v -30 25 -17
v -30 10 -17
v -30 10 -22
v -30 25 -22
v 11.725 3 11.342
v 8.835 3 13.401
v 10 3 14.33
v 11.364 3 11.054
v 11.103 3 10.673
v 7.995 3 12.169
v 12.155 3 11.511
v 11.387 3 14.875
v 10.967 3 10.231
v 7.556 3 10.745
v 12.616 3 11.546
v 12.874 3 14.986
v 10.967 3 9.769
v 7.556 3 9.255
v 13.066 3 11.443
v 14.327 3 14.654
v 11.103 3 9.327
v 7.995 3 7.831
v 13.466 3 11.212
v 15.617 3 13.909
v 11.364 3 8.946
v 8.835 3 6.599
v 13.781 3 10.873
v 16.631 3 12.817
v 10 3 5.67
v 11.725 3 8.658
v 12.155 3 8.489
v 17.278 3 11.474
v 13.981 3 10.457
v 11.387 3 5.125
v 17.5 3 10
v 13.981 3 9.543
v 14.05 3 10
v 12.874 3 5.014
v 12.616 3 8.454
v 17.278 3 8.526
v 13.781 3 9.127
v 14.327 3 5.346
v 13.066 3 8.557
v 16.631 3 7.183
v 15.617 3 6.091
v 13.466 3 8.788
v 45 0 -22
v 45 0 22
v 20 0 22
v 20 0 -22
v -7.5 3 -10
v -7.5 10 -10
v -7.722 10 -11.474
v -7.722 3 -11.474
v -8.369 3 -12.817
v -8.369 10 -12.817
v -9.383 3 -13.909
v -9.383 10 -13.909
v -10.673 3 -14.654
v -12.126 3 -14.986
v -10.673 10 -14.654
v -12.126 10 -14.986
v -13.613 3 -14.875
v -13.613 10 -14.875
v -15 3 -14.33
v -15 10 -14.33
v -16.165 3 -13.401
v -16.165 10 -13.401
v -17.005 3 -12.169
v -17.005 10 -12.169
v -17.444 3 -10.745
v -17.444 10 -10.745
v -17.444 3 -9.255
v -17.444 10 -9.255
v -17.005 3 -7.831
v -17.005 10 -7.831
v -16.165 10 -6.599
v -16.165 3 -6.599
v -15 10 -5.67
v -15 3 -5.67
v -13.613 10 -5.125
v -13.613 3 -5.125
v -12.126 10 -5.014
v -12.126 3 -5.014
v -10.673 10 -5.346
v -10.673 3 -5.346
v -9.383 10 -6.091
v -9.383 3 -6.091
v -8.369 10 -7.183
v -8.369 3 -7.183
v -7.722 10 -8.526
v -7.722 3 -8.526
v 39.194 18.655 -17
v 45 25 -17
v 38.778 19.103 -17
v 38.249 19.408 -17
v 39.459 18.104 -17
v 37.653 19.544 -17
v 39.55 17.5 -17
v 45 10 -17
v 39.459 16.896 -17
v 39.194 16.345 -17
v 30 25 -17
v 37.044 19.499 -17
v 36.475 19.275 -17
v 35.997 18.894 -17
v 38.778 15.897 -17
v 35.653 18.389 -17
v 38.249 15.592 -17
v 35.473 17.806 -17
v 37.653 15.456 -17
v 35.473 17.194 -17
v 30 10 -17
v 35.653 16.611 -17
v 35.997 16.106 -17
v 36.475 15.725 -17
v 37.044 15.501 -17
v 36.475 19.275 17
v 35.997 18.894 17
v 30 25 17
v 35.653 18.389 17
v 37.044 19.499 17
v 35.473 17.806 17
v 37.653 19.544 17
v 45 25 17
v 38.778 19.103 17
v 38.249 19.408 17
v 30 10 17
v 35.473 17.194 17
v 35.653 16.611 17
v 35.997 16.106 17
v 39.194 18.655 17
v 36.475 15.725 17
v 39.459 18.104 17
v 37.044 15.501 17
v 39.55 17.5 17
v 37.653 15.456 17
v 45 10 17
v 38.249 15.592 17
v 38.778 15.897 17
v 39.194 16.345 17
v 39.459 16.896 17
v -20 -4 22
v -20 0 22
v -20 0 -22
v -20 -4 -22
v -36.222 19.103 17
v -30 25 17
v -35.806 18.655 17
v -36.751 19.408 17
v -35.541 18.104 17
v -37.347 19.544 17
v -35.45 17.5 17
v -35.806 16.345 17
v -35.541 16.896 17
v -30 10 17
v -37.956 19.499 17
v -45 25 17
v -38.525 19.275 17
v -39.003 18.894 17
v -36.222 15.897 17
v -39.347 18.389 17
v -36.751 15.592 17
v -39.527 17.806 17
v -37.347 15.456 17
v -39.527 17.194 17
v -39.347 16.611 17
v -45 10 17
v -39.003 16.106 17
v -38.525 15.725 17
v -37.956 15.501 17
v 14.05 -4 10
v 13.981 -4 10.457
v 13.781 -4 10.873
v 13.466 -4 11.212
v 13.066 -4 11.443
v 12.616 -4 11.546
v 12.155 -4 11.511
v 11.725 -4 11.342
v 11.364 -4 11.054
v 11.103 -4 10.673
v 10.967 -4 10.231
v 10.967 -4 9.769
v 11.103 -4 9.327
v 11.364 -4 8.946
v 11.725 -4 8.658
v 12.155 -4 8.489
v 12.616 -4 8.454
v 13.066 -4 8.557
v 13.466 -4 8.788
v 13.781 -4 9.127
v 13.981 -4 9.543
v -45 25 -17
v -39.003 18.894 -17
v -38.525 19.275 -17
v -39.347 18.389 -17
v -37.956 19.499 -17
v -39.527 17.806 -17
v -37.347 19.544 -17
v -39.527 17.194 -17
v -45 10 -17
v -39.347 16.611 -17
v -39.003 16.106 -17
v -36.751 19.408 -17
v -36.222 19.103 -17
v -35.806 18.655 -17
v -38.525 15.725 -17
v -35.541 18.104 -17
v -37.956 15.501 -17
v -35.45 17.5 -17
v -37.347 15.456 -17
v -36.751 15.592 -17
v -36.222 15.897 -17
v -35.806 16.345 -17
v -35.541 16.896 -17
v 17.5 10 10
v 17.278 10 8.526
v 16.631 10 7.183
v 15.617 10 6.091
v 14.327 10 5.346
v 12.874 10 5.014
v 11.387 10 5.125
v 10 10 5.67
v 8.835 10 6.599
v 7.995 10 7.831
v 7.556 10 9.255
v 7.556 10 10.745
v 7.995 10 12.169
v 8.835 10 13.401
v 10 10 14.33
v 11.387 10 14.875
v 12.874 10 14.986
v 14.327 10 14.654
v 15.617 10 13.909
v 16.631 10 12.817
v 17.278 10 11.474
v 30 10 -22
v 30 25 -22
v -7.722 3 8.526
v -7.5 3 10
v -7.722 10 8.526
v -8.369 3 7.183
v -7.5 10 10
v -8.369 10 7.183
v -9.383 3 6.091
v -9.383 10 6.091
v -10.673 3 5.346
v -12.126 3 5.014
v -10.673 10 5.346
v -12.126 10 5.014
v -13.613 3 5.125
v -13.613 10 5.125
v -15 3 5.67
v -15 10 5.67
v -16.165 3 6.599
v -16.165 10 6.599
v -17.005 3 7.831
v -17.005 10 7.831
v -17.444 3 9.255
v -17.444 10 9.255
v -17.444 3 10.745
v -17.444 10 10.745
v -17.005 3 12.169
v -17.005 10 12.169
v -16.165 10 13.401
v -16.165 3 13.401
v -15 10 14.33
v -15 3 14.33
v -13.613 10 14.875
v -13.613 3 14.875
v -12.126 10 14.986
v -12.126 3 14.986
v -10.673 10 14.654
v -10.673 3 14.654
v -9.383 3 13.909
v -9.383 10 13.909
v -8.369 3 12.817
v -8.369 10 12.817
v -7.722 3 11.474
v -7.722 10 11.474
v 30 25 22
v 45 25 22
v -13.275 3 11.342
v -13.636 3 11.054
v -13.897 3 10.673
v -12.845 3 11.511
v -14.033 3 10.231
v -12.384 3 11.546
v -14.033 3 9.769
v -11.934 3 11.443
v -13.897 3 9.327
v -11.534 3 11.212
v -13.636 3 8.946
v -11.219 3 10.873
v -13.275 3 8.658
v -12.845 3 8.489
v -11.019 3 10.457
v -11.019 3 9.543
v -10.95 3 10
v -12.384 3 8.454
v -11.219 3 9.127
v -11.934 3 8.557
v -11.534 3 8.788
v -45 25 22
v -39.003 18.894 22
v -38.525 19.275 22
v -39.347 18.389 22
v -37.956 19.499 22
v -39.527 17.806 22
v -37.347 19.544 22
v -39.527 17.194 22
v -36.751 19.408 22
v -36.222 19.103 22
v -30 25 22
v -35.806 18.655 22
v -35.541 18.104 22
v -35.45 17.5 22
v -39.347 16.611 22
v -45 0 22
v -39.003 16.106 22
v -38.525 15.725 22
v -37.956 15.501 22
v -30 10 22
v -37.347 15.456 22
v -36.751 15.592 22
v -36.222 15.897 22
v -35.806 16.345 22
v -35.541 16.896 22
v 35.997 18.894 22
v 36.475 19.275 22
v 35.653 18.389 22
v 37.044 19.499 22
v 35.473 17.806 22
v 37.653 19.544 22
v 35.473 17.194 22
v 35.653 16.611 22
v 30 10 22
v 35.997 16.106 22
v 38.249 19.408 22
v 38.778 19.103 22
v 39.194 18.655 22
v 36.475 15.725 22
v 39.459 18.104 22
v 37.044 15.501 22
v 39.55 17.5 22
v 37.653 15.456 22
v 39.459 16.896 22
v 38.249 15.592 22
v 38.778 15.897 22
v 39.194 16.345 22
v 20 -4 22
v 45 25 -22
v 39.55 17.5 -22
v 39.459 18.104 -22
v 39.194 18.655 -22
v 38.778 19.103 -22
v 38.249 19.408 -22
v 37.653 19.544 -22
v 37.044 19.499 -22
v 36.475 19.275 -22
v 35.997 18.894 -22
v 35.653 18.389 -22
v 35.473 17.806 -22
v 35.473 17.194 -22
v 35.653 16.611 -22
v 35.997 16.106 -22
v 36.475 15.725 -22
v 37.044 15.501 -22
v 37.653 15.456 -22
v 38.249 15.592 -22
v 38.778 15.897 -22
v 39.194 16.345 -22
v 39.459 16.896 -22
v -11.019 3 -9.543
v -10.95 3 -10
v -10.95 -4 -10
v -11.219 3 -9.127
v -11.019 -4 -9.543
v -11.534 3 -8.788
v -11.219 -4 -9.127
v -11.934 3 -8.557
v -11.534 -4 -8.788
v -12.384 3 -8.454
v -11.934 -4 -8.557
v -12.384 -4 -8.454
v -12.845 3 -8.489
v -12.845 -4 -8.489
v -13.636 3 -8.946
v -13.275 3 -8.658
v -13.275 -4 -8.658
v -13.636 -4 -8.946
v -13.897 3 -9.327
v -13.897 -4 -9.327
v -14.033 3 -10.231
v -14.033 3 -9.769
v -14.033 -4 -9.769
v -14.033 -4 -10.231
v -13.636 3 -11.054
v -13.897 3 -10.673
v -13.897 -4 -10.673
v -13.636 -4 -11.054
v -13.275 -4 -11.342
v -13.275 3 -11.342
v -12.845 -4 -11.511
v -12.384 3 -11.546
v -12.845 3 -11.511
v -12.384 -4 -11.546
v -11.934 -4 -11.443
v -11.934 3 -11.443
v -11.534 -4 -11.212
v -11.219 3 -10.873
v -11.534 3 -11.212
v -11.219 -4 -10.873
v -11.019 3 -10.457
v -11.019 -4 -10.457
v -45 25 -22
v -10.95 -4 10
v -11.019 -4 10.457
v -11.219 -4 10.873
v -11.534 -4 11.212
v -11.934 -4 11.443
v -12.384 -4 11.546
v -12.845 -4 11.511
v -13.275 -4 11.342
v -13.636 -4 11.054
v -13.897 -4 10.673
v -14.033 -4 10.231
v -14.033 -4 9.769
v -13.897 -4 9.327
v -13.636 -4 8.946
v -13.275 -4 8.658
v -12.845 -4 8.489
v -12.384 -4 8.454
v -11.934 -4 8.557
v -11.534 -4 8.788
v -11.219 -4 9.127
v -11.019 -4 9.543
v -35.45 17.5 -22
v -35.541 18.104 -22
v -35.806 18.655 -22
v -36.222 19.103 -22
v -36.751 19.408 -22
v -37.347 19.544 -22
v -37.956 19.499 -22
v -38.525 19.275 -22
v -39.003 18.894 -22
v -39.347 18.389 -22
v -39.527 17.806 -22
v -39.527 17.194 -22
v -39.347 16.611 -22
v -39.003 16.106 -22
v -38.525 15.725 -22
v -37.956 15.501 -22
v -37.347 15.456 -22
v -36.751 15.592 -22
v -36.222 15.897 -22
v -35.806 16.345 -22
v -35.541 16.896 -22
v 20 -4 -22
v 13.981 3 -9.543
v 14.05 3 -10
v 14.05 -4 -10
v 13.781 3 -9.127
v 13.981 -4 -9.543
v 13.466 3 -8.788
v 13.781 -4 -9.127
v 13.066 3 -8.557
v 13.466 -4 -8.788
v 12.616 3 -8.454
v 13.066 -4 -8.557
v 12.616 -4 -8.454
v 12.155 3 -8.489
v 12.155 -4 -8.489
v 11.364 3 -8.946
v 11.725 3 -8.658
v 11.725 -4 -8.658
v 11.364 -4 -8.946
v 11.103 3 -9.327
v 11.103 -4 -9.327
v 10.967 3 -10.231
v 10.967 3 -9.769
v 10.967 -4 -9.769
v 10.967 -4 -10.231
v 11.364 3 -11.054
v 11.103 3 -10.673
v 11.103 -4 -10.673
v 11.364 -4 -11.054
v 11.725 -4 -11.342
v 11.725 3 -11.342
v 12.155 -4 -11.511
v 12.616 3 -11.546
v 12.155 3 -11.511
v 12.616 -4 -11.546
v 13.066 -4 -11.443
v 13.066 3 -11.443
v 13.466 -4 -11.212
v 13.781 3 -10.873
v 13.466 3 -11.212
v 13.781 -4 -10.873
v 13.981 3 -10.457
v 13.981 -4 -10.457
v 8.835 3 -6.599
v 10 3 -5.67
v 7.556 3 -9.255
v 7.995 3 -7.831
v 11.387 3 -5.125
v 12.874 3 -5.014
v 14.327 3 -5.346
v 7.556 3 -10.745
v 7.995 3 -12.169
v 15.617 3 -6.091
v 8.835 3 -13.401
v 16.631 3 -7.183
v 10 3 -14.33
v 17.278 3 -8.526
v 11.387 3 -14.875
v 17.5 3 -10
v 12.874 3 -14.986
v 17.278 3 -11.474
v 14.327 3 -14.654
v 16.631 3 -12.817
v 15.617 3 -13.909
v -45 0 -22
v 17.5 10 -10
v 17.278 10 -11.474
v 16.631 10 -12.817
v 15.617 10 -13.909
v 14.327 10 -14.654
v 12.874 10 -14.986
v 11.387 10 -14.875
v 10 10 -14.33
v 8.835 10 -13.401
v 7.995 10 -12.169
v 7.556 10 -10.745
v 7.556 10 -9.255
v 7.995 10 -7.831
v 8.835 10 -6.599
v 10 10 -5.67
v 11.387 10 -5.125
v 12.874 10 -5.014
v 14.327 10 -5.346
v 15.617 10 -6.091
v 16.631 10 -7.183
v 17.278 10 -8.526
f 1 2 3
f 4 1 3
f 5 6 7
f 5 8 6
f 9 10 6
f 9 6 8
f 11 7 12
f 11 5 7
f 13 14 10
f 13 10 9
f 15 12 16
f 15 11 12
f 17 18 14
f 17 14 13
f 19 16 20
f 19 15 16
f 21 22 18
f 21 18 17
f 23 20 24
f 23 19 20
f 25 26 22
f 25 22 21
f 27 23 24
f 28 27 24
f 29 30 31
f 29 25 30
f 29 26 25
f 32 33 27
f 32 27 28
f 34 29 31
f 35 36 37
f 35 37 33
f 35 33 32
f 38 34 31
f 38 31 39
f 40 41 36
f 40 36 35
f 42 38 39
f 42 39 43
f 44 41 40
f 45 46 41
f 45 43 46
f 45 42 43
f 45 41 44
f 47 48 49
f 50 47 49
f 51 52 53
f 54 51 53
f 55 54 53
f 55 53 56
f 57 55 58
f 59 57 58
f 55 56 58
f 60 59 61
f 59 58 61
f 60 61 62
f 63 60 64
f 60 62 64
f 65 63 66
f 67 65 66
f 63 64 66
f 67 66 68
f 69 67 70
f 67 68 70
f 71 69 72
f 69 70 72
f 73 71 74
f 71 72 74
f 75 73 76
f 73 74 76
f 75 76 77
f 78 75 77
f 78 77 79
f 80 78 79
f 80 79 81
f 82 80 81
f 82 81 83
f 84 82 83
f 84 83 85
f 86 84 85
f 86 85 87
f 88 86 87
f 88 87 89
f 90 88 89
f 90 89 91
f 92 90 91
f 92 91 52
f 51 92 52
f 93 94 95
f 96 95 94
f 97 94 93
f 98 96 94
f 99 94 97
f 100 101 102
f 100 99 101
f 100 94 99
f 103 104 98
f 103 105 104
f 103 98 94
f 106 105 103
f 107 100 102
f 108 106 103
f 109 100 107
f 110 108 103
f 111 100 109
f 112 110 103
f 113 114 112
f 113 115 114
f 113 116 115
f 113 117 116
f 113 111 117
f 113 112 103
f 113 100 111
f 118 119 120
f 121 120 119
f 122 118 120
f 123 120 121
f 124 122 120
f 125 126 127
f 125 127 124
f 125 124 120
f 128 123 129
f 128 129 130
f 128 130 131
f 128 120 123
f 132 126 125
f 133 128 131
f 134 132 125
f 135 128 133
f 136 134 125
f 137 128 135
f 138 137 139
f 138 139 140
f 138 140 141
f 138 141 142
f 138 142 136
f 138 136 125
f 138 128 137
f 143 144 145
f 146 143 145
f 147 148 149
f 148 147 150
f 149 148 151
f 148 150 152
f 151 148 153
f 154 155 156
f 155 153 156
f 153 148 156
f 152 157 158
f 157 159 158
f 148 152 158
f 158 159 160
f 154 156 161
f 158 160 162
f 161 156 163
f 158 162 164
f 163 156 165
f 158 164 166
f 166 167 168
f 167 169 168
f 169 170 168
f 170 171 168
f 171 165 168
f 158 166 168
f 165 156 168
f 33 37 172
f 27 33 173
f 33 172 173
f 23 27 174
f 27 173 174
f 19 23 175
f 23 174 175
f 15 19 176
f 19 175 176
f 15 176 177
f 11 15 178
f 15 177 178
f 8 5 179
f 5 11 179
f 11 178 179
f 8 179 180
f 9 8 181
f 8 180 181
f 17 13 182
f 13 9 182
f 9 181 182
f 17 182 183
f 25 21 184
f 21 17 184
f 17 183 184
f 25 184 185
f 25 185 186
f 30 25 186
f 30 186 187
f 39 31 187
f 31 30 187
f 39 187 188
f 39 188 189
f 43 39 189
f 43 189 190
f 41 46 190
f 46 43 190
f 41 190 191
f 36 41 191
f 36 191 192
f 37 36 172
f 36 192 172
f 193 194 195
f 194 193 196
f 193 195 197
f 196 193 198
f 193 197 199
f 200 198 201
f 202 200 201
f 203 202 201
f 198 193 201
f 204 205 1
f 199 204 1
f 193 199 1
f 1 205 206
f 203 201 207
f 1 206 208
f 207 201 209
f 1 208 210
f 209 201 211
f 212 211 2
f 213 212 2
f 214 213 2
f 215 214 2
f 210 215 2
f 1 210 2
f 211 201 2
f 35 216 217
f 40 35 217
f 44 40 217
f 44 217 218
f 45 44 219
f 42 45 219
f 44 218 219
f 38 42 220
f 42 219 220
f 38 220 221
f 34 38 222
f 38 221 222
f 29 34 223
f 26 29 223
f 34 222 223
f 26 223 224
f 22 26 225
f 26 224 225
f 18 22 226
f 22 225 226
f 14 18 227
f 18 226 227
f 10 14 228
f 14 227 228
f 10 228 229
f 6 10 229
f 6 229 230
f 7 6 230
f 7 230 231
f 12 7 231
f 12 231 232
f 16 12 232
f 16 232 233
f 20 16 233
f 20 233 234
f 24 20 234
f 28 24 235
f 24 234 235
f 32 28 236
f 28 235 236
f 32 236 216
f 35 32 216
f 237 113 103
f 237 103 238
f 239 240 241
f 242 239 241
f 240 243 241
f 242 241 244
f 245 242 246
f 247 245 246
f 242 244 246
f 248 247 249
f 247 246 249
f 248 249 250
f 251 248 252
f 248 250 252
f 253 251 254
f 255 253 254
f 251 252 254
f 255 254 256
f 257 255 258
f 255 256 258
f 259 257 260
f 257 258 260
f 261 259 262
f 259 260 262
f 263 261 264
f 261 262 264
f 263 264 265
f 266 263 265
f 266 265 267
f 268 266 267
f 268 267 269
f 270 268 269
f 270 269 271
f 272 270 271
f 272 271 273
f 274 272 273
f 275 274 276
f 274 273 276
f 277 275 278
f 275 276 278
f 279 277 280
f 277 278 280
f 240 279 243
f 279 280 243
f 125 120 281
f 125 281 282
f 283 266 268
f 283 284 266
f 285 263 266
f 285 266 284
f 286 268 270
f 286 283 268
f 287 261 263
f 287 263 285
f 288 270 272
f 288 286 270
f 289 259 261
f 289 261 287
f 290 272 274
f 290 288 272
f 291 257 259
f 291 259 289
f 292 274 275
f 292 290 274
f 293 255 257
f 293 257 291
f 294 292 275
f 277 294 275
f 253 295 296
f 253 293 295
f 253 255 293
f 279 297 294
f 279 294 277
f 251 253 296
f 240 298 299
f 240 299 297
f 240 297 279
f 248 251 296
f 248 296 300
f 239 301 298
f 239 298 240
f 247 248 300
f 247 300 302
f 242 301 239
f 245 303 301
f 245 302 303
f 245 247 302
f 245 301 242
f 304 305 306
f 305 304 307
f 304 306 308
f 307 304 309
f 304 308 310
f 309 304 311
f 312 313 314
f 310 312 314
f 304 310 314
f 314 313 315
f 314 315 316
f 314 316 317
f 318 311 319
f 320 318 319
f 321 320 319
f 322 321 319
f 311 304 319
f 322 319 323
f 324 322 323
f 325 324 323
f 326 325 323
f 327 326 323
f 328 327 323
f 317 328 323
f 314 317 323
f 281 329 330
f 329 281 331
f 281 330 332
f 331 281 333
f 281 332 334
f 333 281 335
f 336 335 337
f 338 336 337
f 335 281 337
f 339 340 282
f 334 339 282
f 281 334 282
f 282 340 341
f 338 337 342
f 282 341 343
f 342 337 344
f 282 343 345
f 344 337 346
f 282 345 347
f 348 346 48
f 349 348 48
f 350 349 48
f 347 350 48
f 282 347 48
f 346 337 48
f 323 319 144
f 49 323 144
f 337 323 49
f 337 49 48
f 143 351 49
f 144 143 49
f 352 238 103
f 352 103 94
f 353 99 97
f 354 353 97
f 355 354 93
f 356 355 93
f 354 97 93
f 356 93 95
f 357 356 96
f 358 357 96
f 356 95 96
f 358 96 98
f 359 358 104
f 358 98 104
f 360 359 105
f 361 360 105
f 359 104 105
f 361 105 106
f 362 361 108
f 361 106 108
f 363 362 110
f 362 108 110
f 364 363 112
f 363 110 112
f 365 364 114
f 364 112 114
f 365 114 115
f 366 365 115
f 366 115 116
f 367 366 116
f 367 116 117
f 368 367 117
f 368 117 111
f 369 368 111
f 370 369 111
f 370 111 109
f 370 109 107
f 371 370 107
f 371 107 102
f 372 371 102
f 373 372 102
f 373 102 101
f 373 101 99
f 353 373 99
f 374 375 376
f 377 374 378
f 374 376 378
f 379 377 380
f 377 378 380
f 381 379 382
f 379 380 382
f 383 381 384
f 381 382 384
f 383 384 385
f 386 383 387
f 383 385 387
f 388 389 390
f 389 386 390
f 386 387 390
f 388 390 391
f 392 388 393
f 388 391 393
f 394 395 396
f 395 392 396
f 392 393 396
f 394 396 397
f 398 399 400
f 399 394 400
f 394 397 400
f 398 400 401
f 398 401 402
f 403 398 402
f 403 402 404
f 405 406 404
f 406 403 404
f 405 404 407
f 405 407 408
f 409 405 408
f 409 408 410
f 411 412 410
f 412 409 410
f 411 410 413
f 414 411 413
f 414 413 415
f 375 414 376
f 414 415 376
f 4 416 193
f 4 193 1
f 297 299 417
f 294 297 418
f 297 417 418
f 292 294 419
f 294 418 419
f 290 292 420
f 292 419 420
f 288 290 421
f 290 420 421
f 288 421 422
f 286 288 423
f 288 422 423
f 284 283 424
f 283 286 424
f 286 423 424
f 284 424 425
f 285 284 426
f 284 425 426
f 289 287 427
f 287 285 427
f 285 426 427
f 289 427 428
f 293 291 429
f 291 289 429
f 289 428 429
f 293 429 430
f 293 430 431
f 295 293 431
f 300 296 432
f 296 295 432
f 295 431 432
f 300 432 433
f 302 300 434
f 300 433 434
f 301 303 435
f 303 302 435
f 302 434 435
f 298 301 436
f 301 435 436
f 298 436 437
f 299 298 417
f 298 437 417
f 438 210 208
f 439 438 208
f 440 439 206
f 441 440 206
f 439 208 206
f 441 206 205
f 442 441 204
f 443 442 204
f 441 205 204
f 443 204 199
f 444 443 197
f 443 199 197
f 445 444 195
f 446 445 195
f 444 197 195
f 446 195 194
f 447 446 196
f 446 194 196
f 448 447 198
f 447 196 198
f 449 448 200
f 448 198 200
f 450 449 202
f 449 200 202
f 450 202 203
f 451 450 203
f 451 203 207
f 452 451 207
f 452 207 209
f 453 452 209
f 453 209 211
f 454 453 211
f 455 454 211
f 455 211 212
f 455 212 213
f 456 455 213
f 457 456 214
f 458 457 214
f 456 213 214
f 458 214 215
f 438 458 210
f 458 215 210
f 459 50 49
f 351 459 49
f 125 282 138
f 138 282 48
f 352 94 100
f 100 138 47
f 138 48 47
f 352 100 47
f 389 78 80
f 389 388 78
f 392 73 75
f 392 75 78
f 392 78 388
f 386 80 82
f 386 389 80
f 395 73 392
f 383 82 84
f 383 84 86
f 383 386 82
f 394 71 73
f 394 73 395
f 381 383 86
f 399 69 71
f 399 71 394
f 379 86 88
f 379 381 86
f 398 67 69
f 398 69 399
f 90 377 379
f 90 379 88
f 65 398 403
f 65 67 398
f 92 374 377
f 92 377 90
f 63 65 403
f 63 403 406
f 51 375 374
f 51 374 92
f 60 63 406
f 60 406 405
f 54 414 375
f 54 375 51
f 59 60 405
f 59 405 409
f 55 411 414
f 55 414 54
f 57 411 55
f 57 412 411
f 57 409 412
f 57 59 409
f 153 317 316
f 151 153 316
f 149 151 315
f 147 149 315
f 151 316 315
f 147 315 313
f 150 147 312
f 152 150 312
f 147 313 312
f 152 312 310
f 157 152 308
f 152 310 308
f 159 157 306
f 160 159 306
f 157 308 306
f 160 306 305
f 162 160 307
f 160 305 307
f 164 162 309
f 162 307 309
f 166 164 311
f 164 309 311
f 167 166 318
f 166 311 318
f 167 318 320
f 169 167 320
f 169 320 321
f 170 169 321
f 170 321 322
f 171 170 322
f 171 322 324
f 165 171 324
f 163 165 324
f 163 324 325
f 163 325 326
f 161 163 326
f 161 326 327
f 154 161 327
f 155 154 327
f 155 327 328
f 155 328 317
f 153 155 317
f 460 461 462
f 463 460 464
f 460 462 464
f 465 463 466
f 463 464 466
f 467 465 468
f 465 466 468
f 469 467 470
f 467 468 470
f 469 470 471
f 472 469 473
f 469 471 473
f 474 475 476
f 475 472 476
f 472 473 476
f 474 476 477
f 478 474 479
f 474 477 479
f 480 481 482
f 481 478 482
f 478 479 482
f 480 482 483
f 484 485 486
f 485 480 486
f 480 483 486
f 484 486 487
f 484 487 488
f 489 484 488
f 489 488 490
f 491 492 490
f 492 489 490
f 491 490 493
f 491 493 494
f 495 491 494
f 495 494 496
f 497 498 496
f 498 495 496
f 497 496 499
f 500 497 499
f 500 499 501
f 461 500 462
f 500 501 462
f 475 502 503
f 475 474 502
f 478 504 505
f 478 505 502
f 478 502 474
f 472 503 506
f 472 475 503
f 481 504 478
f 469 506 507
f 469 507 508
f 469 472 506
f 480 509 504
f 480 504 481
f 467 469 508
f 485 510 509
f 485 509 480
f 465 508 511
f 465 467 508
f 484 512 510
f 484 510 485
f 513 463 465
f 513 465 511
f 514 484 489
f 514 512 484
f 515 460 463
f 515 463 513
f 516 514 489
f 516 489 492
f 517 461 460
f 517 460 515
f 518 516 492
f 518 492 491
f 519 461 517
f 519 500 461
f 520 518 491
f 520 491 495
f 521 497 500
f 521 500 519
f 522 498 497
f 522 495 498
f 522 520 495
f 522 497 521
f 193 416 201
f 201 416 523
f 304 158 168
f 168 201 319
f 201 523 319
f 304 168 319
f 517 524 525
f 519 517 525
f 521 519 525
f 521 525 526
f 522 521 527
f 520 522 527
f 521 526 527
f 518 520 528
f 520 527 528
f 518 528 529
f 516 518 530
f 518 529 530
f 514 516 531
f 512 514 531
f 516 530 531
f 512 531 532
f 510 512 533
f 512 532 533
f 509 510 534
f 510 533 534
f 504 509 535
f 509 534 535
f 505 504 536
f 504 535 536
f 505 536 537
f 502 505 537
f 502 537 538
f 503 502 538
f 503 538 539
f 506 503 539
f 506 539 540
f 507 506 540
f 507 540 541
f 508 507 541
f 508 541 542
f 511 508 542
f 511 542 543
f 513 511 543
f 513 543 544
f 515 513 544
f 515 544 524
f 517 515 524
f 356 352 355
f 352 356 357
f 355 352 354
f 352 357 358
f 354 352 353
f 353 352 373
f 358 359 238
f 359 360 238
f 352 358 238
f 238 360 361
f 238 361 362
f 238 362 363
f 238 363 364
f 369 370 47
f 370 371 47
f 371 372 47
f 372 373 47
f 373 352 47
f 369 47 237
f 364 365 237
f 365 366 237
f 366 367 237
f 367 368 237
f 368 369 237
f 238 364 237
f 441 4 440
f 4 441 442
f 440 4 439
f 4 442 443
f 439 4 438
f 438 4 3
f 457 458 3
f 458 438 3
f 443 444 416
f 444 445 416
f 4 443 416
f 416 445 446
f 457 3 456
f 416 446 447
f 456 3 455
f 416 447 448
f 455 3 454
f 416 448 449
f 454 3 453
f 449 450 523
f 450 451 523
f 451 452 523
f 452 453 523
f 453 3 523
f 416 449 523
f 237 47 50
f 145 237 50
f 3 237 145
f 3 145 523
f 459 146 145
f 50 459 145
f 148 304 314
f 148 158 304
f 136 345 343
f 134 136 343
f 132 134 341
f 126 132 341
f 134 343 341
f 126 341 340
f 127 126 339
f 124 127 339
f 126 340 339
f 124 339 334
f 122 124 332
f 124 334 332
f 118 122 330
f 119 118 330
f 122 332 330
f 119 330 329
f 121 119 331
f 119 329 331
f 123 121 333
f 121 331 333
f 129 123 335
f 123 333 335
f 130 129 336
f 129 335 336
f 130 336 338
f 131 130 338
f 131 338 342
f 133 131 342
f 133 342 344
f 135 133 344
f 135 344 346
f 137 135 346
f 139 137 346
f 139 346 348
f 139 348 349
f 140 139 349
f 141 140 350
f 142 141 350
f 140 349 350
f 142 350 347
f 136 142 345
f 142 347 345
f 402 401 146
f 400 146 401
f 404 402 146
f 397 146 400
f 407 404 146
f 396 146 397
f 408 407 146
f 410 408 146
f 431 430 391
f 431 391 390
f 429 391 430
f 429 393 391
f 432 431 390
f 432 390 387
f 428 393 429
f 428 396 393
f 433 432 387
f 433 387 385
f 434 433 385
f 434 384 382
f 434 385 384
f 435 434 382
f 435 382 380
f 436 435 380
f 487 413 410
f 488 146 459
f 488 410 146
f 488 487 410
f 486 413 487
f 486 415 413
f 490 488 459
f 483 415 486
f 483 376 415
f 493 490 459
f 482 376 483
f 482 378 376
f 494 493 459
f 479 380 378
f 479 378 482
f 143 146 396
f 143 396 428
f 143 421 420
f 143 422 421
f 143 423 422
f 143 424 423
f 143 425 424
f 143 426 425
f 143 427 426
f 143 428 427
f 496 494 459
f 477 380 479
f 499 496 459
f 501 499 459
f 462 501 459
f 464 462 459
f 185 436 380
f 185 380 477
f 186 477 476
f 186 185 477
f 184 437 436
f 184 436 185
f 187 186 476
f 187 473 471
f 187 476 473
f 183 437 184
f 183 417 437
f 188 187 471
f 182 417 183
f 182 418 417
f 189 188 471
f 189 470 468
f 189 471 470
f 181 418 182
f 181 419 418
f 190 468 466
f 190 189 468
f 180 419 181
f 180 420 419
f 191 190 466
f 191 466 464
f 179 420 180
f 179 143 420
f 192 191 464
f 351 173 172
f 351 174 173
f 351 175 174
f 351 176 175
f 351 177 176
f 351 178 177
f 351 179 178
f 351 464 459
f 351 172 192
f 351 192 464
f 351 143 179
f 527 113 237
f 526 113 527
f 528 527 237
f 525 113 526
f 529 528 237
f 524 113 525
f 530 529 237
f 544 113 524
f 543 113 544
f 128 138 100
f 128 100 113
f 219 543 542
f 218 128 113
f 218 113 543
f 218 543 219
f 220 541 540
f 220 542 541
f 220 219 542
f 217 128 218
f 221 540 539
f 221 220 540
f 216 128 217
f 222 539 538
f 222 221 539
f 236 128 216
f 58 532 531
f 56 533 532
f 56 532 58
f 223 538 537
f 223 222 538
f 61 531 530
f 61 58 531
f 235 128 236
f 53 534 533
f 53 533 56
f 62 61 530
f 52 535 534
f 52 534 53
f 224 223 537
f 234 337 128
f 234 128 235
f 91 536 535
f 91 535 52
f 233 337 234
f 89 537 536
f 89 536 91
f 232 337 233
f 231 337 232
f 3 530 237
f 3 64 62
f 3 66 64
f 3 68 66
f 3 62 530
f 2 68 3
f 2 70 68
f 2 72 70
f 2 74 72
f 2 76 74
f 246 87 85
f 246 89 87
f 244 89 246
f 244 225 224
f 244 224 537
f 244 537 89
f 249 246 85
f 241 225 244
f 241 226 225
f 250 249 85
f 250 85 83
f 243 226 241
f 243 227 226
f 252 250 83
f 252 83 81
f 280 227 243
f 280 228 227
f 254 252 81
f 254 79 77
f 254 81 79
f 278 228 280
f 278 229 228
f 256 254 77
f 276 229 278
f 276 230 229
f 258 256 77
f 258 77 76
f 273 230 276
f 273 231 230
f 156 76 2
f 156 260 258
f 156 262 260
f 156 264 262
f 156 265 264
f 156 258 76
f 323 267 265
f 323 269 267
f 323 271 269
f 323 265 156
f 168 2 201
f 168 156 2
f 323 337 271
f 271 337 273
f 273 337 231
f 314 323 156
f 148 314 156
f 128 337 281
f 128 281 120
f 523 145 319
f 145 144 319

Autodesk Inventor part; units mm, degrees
ref_plane "YZ Plane" through (0, 0, 0) normal (1, 0, 0) x (0, 1, 0)
ref_plane "XZ Plane" through (0, 0, 0) normal (0, 1, 0) x (-1, 0, 0)
ref_plane "XY Plane" through (0, 0, 0) normal (0, 0, 1) x (1, 0, 0)
sketch "Sketch1" plane through (0, 0, 0) normal (0, 1, 0) x (-1, 0, 0)
  line L0 (45, 22) -> (-45, 22)
  line L1 (-45, 22) -> (-45, -22)
  line L2 (-45, -22) -> (45, -22)
  line L3 (45, -22) -> (45, 22)
  line L4 (45, 22) -> (-45, -22) construction
  line L5 (-45, 22) -> (45, -22) construction
  point P0 (0, 0)
  dimension "d0" = 90
  dimension "d1" = 44
extrude "Extrusion1" add sketch "Sketch1" along normal blind 10
sketch "Sketch2" plane through (0, 10, 0) normal (0, 1, 0) x (1, 0, 0)
  line L0 (45, -22) -> (30, -22)
  line L1 (30, -22) -> (30, -17)
  line L2 (30, -17) -> (45, -17)
  line L3 (45, -17) -> (45, -22)
  line L4 (45, 17) -> (30, 17)
  line L5 (30, 17) -> (30, 22)
  line L6 (30, 22) -> (45, 22)
  line L7 (45, 22) -> (45, 17)
  line L8 (-45, -22) -> (-30, -22)
  line L9 (-30, -22) -> (-30, -17)
  line L10 (-30, -17) -> (-45, -17)
  line L11 (-45, -17) -> (-45, -22)
  line L12 (-45, 17) -> (-30, 17)
  line L13 (-30, 17) -> (-30, 22)
  line L14 (-30, 22) -> (-45, 22)
  line L15 (-45, 22) -> (-45, 17)
  line L16 (-45, 22) -> (-45, -22) projected
  line L17 (-45, -22) -> (45, -22) projected
  line L18 (45, 22) -> (-45, 22) projected
  line L19 (45, -22) -> (45, 22) projected
  point P0 (0, 0)
  dimension "d4" = 5
  dimension "d5" = 5
  dimension "d6" = 5
  dimension "d7" = 5
  dimension "d8" = 15
  dimension "d9" = 15
  dimension "d10" = 15
  dimension "d11" = 15
extrude "Extrusion2" add sketch "Sketch2" along normal blind 15 contours L0 L1 L2 L3 | L8 L11 L10 L9 | L4 L5 L6 L7 | L15 L14 L13 L12
sketch "Sketch3" plane through (-45, 0, 22) normal (0, 0, 1) x (1, 0, 0)
  circle A0 centre (82.5, 17.5) radius 2.05
  circle A1 centre (7.5, 17.5) radius 2.05
  line L0 (75, 25) -> (90, 25) projected
  line L1 (90, 0) -> (90, 25) projected
  line L2 (0, 25) -> (15, 25) projected
  line L3 (15, 10) -> (15, 25) projected
  point P0 (45, 0)
  point P1 (15, 17.5)
  dimension "d14" = 4.1
  dimension "d15" = 4.1
  dimension "d16" = 7.5
  dimension "d17" = 7.5
  dimension "d18" = 7.5
  dimension "d19" = 7.5
extrude "Extrusion3" cut sketch "Sketch3" against normal through all
sketch "Sketch4" plane through (0, 0, 0) normal (0, -1, 0) x (1, 0, 0)
  line L0 (-20, -22) -> (20, -22)
  line L1 (20, -22) -> (20, 22)
  line L2 (20, 22) -> (-20, 22)
  line L3 (-20, 22) -> (-20, -22)
  line L4 (-20, -22) -> (20, 22) construction
  line L5 (20, -22) -> (-20, 22) construction
  point P0 (0, 0)
  dimension "d22" = 40
  dimension "d23" = 44
extrude "Extrusion4" add sketch "Sketch4" along normal blind 4
sketch "Sketch5" plane through (0, -4, 0) normal (0, -1, 0) x (1, 0, 0)
  circle A0 centre (-12.5, -10) radius 1.55
  circle A1 centre (12.5, -10) radius 1.55
  circle A2 centre (-12.5, 10) radius 1.55
  circle A3 centre (12.5, 10) radius 1.55
  point P0 (0, 0)
  dimension "d26" = 3.1
  dimension "d27" = 3.1
  dimension "d28" = 3.1
  dimension "d29" = 3.1
  dimension "d30" = 12.5
  dimension "d31" = 12.5
  dimension "d32" = 12.5
  dimension "d33" = 12.5
  dimension "d34" = 10
  dimension "d35" = 10
  dimension "d36" = 10
  dimension "d37" = 10
extrude "Extrusion5" cut sketch "Sketch5" against normal through all
sketch "Sketch6" plane through (0, 10, 0) normal (0, 1, 0) x (1, 0, 0)
  circle A0 centre (12.5, -10) radius 1.55 projected
  circle A1 centre (-12.5, -10) radius 1.55 projected
  circle A2 centre (12.5, 10) radius 1.55 projected
  circle A3 centre (-12.5, 10) radius 1.55 projected
  circle A4 centre (12.5, -10) radius 5
  circle A5 centre (-12.5, -10) radius 5
  circle A6 centre (12.5, 10) radius 5
  circle A7 centre (-12.5, 10) radius 5
  point P0 (0, 0)
  dimension "d40" = 10
  dimension "d41" = 10
  dimension "d42" = 10
  dimension "d43" = 10
extrude "Extrusion6" cut sketch "Sketch6" against normal blind 7
properties part number "rail_top" material "ABS Plastic"
